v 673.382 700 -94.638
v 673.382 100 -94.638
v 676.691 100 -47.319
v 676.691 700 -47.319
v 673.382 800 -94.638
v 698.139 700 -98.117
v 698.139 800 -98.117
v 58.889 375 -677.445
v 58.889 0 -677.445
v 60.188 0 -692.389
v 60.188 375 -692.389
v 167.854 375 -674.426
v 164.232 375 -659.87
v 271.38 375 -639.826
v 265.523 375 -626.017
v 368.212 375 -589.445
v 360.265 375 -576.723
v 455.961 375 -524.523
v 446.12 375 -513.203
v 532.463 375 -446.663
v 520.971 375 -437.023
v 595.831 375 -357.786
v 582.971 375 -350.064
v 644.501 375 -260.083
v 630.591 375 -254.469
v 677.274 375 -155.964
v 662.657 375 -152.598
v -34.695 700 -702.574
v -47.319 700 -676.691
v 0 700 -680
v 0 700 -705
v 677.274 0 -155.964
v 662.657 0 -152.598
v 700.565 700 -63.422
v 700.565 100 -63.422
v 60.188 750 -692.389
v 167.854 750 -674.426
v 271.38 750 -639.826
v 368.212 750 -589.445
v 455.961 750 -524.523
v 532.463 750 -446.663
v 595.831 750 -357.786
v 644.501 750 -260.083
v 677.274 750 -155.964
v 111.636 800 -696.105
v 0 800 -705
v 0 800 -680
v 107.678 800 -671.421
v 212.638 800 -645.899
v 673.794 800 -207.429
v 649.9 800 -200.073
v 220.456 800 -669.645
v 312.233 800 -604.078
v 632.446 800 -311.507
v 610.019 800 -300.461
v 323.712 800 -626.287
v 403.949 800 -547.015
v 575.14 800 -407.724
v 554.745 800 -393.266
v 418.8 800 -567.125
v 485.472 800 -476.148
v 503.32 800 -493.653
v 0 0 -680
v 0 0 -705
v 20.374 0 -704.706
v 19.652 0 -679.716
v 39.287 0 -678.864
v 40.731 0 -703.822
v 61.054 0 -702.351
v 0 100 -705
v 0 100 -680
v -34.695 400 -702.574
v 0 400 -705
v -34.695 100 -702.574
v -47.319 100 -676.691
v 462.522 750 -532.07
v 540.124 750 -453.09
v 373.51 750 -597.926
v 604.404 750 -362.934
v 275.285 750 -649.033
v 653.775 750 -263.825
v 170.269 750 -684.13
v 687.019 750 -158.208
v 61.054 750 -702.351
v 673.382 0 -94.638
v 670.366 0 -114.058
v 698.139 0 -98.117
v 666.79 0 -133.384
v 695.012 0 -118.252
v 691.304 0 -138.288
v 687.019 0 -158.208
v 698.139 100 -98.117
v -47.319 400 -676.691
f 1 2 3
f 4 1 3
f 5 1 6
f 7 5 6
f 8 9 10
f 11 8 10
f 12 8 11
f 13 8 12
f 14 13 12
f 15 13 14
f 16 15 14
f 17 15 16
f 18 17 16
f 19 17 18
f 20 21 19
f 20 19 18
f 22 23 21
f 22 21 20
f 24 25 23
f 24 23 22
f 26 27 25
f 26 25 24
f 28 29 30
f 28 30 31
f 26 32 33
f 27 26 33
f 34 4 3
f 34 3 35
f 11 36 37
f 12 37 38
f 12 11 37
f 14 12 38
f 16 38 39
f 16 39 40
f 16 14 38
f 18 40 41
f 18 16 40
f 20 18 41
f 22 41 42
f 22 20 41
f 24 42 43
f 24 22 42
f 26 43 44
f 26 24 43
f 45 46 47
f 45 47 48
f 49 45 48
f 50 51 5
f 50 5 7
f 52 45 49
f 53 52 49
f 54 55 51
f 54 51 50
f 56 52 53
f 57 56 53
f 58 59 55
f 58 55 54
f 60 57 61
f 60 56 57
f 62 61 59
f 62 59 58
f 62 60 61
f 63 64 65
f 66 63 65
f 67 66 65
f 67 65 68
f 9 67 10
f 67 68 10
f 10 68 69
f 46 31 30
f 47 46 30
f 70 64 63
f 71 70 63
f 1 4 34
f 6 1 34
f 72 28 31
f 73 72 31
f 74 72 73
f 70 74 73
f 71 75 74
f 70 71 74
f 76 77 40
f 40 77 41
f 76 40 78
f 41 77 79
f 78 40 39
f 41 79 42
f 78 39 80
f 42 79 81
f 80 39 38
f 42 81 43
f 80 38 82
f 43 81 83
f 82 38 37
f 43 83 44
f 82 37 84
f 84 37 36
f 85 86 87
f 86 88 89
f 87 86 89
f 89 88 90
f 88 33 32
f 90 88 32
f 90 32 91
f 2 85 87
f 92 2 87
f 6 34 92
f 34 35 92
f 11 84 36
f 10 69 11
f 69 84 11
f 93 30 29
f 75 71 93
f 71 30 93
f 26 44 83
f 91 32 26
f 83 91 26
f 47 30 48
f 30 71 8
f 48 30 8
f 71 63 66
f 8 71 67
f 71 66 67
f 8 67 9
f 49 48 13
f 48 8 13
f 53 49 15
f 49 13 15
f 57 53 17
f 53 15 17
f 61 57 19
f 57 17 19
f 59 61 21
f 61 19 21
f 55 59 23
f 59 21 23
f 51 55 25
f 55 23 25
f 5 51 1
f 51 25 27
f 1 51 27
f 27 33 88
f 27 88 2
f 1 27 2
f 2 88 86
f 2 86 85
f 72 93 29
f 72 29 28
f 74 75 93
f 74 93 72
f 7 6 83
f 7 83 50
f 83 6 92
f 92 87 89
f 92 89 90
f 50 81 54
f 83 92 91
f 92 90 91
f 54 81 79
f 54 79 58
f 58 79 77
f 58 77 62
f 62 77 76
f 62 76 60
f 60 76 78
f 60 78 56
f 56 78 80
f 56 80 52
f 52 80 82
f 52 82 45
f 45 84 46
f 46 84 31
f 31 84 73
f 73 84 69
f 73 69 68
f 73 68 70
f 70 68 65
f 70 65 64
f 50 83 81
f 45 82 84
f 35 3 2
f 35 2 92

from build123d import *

# Parameters (mm, degrees)
EXTRUDE_1_DEPTH       = 800
EXTRUDE_2_DEPTH       = 300
MIRROR_3_COPY_1_DEPTH = 300
MIRROR_3_COPY_2_DEPTH = 300
CUT_EXTRUDE_1_DEPTH   = 750
CUT_EXTRUDE_2_DEPTH   = 375


with BuildPart() as part:
    # 草图1 → 凸台-拉伸1 (new body)
    with BuildSketch(Plane(origin=(0, 0, 0), x_dir=(1, 0, 0), z_dir=(0, 1, 0))):
        with BuildLine():
            Line((0, 705), (0, 680))
            ThreePointArc((0, 680), (446.120139714, 513.202514551), (673.382286744, 94.637708653))
            Line((673.382286744, 94.637708653), (698.138988463, 98.117036177))
            ThreePointArc((698.138988463, 98.117036177), (462.521615438, 532.070254057), (0, 705))
        make_face()
    extrude(amount=EXTRUDE_1_DEPTH)

    # 草图2 → 凸台-拉伸2 (add)
    with BuildSketch(Plane(origin=(0, 400, 0), x_dir=(1, 0, 0), z_dir=(0, 1, 0))):
        Polygon((698.138988463, 98.117036177), (673.382286744, 94.637708653), (676.691143372, 47.318854326), (700.56509889, 63.422040654), align=None)
    extrude_2 = extrude(amount=-EXTRUDE_2_DEPTH)

    # 镜向1: 凸台-拉伸2 across plane
    add(extrude_2.mirror(Plane(origin=(446.120139714, 800, -513.202514551), x_dir=(-0.6560590289905062, 0, 0.754709580222773), z_dir=(-0.7547095802227732, 0, -0.656059028990506))))

    # 镜向2: 凸台-拉伸2 across plane
    add(extrude_2.mirror(Plane.ZX.offset(400)))

    # 镜向3 copy 1 sketch → 镜向3 copy 1 (add)
    with BuildSketch(Plane(origin=(0, 400, 0), x_dir=(-0.13917310096006918, 0, -0.99026806874157), z_dir=(0, -1, 0))):
        Polygon((698.138988463, 98.117036177), (673.382286744, 94.637708653), (676.691143372, 47.318854326), (700.56509889, 63.422040654), align=None)
    extrude(amount=-MIRROR_3_COPY_1_DEPTH)

    # 镜向3 copy 2 sketch → 镜向3 copy 2 (add)
    with BuildSketch(Plane(origin=(0, 400, 0), x_dir=(-0.13917310096006918, 0, -0.99026806874157), z_dir=(0, 1, 0))):
        Polygon((698.138988463, -98.117036177), (673.382286744, -94.637708653), (676.691143372, -47.318854326), (700.56509889, -63.422040654), align=None)
    extrude(amount=-MIRROR_3_COPY_2_DEPTH)

    # 草图4 → 切除-拉伸1 (cut)
    with BuildSketch(Plane.XZ):
        with BuildLine():
            Line((677.274077507, -155.96417517), (687.019028263, -158.208264022))
            ThreePointArc((687.019028263, -158.208264022), (462.521615438, -532.070254057), (61.05402349, -702.351341008))
            Line((61.05402349, -702.351341008), (60.188008972, -692.388910639))
            ThreePointArc((60.188008972, -692.388910639), (455.961025148, -524.523158255), (677.274077507, -155.96417517))
        make_face()
    extrude(amount=-CUT_EXTRUDE_1_DEPTH, mode=Mode.SUBTRACT)

    # 草图5 → 切除-拉伸2 (cut)
    with BuildSketch(Plane.XZ):
        with BuildLine():
            Line((677.274077507, -155.96417517), (662.656651374, -152.598041893))
            ThreePointArc((662.656651374, -152.598041893), (446.120139714, -513.202514551), (58.888987196, -677.445265086))
            Line((58.888987196, -677.445265086), (60.188008972, -692.388910639))
            ThreePointArc((60.188008972, -692.388910639), (455.961025148, -524.523158255), (677.274077507, -155.96417517))
        make_face()
    extrude(amount=-CUT_EXTRUDE_2_DEPTH, mode=Mode.SUBTRACT)


solid = part.part
